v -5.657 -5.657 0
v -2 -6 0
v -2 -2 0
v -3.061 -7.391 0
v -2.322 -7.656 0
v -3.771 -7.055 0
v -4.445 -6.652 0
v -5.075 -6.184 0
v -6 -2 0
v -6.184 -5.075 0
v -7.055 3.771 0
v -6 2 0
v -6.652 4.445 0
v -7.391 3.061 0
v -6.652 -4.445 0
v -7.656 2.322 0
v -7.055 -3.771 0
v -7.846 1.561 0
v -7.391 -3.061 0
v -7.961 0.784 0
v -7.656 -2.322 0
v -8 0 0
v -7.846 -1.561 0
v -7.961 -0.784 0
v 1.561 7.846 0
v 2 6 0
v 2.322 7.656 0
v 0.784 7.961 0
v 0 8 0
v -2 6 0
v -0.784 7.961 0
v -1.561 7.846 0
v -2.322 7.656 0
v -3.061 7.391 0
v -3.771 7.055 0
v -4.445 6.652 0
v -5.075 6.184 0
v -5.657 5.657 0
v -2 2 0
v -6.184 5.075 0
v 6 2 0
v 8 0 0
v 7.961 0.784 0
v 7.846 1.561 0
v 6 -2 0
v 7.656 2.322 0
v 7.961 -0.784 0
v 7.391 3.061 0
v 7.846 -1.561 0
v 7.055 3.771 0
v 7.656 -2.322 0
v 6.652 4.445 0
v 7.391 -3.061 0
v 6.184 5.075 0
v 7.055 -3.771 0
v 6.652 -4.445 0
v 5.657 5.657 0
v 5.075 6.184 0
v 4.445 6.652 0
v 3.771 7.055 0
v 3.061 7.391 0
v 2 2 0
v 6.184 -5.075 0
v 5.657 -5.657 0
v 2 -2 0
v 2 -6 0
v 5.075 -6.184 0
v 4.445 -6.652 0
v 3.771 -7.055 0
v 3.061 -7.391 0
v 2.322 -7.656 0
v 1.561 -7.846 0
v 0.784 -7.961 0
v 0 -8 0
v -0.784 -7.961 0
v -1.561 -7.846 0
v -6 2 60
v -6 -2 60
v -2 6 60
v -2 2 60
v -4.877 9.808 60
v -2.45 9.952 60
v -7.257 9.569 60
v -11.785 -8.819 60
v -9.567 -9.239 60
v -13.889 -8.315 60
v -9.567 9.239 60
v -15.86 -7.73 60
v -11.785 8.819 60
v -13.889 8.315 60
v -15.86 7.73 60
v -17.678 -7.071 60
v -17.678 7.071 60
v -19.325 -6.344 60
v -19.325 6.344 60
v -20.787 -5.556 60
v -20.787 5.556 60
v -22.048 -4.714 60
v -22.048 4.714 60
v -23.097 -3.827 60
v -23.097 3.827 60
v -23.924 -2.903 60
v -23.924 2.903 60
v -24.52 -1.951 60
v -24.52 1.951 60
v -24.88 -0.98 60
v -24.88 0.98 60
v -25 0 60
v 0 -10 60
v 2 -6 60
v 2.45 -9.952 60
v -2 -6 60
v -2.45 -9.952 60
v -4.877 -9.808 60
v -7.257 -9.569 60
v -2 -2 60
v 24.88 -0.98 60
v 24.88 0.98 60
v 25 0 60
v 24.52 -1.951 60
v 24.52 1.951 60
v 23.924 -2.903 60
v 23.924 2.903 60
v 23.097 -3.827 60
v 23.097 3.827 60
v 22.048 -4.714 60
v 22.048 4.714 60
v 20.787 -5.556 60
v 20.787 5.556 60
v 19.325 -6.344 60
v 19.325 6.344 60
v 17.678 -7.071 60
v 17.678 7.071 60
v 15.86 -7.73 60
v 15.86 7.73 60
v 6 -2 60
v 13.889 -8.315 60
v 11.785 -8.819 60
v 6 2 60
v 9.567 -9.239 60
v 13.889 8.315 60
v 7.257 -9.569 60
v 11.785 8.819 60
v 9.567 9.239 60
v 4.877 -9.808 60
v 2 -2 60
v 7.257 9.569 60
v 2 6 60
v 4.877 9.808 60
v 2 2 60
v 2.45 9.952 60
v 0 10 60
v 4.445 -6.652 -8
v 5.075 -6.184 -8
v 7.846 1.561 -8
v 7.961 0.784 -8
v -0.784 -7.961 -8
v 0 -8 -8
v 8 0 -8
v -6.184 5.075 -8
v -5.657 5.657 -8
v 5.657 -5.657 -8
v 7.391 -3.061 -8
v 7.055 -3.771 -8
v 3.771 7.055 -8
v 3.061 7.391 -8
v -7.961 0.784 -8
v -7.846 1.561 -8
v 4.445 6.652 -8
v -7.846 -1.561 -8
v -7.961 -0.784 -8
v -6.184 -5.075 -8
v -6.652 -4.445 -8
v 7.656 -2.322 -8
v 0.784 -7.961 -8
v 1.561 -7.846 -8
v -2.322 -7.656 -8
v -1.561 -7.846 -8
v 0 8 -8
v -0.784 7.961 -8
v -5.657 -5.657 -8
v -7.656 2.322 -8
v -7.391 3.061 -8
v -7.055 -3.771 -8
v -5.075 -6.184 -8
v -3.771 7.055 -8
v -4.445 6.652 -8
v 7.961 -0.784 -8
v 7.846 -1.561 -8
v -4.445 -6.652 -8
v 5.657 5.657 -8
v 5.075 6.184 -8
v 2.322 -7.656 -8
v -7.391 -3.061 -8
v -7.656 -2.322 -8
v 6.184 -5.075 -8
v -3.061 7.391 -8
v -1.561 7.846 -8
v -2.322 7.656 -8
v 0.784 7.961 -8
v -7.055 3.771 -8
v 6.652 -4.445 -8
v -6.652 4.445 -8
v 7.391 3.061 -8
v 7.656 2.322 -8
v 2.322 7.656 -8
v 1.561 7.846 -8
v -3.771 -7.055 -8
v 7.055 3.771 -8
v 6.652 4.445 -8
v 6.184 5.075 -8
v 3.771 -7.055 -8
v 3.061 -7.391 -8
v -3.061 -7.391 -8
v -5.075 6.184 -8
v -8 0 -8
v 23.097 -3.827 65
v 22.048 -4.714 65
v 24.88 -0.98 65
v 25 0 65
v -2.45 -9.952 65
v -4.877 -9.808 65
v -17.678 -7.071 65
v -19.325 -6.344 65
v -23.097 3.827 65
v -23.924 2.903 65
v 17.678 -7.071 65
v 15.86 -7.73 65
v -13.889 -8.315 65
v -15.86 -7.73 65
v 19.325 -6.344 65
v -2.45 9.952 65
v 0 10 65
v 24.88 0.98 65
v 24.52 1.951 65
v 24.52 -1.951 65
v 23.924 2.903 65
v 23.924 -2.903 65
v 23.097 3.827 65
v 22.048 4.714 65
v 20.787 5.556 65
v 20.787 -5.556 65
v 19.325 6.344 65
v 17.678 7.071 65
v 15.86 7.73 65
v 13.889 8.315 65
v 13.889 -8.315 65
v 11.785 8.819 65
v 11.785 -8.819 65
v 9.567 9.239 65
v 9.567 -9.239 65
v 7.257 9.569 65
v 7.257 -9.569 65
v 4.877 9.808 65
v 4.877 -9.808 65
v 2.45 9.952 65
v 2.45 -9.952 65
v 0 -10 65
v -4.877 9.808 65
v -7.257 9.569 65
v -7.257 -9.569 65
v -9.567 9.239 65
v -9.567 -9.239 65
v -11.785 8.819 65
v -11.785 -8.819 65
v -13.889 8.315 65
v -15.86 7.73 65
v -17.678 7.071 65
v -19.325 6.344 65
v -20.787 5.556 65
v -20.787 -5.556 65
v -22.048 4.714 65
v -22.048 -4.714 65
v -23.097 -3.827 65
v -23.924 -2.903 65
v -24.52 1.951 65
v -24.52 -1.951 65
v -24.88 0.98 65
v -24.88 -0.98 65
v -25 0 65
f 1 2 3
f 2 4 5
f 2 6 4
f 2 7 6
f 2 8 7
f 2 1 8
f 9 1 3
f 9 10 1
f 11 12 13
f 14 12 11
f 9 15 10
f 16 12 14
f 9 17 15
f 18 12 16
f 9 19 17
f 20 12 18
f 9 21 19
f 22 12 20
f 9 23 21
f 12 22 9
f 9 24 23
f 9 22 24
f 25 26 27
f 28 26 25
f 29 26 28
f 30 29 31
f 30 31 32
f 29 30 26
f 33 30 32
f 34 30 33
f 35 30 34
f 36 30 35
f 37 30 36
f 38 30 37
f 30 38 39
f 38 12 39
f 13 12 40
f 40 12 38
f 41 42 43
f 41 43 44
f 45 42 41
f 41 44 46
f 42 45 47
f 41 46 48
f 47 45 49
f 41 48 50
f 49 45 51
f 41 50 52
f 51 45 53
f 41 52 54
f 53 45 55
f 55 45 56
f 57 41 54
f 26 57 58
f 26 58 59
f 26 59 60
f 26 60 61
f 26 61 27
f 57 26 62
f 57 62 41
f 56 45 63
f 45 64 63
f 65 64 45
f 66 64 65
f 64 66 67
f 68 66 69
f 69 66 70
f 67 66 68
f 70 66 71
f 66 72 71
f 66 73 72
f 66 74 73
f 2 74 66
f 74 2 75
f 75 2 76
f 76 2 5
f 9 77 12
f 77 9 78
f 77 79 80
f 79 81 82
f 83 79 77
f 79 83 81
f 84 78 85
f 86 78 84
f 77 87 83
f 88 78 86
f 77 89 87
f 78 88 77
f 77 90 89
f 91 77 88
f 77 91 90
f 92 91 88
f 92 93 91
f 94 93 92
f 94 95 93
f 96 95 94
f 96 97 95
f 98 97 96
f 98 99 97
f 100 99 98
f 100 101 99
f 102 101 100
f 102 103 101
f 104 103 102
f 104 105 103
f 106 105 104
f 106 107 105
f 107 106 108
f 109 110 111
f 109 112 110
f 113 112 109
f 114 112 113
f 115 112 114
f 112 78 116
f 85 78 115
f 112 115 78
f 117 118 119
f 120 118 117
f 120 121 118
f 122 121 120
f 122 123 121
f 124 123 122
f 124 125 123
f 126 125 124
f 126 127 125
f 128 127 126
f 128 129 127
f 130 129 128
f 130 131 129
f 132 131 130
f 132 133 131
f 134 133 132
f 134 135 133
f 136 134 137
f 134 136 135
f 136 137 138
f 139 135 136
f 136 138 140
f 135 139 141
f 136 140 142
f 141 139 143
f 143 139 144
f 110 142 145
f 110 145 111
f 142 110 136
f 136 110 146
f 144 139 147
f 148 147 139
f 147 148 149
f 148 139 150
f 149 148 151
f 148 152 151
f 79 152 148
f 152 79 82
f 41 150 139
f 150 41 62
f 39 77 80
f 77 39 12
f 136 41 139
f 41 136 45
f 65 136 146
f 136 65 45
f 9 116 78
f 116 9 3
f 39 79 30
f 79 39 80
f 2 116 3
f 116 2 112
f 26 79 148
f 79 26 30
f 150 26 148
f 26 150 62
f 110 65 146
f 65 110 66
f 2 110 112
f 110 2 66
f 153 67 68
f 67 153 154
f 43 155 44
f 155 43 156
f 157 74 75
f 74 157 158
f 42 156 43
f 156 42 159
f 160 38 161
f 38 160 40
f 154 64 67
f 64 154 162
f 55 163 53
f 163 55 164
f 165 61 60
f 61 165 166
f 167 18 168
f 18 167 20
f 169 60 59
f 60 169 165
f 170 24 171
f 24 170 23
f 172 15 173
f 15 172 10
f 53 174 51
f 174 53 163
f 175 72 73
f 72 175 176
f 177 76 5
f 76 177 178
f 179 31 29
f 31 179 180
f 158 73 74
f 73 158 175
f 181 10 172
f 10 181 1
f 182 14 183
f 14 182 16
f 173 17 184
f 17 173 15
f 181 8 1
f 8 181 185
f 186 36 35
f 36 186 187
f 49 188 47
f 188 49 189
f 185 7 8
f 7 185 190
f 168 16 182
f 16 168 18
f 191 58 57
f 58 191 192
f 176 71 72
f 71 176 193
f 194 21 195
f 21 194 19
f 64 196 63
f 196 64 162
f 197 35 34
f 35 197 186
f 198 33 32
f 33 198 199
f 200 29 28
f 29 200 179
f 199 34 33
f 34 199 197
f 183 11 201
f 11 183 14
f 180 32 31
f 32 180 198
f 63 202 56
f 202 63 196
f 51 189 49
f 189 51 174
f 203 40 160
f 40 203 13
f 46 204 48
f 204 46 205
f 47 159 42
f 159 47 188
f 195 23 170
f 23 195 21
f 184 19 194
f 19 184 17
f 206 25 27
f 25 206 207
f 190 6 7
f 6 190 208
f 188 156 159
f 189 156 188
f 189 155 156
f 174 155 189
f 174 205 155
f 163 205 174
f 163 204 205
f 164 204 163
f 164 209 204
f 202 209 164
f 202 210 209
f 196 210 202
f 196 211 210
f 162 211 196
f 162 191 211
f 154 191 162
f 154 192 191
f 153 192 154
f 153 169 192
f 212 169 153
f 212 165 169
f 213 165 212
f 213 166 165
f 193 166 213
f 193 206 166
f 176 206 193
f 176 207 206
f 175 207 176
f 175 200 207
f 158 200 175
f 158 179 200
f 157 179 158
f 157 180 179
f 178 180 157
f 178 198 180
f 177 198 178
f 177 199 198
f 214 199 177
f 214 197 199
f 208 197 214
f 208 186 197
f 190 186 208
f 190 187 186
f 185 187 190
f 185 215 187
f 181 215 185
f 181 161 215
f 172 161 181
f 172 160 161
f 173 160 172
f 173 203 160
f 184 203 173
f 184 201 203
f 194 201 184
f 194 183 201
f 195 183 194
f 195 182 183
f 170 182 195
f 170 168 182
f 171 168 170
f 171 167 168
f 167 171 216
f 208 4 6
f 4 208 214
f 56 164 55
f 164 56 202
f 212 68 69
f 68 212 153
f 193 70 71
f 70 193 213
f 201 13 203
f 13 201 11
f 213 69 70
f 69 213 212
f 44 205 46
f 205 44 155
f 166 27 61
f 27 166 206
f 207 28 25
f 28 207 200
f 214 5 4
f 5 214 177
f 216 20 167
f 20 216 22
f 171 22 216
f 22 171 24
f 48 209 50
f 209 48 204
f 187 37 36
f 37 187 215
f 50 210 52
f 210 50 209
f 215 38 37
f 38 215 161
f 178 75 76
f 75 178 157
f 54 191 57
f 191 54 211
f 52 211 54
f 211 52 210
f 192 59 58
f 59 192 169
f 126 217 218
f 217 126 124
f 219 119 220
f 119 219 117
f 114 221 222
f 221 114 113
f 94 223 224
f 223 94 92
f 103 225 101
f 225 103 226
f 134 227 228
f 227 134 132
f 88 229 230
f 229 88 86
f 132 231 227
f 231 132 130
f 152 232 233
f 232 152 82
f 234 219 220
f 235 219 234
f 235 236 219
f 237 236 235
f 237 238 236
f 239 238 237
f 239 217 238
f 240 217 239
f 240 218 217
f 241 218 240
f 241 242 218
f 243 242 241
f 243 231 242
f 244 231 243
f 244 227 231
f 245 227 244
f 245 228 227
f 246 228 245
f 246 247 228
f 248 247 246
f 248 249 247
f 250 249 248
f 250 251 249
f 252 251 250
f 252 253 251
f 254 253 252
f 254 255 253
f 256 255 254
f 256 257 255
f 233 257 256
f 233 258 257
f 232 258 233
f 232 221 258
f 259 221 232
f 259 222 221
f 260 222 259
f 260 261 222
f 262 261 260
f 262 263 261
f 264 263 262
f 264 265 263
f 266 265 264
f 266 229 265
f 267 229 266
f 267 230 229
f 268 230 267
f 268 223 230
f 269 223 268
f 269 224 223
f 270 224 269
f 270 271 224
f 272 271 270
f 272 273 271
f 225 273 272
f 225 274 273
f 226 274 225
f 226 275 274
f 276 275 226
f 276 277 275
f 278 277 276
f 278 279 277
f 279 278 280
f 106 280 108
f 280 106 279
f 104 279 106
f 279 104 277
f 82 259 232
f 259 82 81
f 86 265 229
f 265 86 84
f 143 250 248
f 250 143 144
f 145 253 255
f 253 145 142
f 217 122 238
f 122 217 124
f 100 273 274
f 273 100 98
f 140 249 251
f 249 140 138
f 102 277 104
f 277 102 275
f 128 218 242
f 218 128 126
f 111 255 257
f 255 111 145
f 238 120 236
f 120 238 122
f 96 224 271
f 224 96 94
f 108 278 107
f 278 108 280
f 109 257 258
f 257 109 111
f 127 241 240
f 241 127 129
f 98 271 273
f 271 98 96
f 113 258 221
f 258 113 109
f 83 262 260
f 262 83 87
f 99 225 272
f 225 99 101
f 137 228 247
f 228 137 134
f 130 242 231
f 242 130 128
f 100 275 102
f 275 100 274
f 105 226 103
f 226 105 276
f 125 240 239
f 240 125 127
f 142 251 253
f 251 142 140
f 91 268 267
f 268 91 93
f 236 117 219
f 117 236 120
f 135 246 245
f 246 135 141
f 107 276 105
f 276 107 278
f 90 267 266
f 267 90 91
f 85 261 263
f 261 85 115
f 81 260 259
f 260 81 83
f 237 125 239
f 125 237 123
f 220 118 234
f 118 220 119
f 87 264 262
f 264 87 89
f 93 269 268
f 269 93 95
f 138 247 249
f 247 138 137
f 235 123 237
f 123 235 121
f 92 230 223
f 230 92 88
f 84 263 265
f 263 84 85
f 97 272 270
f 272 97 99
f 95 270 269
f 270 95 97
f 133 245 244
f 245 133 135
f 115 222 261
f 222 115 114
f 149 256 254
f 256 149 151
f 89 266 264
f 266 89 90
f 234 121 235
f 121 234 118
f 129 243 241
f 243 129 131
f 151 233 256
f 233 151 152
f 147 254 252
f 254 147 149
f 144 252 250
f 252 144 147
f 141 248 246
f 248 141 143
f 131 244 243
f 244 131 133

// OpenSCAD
$fn=64;


module cross(height, w) {
    linear_extrude(height)
        square([w, 4], center = true);


    linear_extrude(height)
        square([4, w], center = true);
}

module plunge(w) {
    linear_extrude(w/2) 
        circle(d=w);
}

l = 60;
w = 16;

cross(l, w-4);
translate([0, 0, -w/2]) plunge(w);

translate([0,0,l])
    linear_extrude(5) 
        scale([2.5, 1]) 
            circle(d=20);
